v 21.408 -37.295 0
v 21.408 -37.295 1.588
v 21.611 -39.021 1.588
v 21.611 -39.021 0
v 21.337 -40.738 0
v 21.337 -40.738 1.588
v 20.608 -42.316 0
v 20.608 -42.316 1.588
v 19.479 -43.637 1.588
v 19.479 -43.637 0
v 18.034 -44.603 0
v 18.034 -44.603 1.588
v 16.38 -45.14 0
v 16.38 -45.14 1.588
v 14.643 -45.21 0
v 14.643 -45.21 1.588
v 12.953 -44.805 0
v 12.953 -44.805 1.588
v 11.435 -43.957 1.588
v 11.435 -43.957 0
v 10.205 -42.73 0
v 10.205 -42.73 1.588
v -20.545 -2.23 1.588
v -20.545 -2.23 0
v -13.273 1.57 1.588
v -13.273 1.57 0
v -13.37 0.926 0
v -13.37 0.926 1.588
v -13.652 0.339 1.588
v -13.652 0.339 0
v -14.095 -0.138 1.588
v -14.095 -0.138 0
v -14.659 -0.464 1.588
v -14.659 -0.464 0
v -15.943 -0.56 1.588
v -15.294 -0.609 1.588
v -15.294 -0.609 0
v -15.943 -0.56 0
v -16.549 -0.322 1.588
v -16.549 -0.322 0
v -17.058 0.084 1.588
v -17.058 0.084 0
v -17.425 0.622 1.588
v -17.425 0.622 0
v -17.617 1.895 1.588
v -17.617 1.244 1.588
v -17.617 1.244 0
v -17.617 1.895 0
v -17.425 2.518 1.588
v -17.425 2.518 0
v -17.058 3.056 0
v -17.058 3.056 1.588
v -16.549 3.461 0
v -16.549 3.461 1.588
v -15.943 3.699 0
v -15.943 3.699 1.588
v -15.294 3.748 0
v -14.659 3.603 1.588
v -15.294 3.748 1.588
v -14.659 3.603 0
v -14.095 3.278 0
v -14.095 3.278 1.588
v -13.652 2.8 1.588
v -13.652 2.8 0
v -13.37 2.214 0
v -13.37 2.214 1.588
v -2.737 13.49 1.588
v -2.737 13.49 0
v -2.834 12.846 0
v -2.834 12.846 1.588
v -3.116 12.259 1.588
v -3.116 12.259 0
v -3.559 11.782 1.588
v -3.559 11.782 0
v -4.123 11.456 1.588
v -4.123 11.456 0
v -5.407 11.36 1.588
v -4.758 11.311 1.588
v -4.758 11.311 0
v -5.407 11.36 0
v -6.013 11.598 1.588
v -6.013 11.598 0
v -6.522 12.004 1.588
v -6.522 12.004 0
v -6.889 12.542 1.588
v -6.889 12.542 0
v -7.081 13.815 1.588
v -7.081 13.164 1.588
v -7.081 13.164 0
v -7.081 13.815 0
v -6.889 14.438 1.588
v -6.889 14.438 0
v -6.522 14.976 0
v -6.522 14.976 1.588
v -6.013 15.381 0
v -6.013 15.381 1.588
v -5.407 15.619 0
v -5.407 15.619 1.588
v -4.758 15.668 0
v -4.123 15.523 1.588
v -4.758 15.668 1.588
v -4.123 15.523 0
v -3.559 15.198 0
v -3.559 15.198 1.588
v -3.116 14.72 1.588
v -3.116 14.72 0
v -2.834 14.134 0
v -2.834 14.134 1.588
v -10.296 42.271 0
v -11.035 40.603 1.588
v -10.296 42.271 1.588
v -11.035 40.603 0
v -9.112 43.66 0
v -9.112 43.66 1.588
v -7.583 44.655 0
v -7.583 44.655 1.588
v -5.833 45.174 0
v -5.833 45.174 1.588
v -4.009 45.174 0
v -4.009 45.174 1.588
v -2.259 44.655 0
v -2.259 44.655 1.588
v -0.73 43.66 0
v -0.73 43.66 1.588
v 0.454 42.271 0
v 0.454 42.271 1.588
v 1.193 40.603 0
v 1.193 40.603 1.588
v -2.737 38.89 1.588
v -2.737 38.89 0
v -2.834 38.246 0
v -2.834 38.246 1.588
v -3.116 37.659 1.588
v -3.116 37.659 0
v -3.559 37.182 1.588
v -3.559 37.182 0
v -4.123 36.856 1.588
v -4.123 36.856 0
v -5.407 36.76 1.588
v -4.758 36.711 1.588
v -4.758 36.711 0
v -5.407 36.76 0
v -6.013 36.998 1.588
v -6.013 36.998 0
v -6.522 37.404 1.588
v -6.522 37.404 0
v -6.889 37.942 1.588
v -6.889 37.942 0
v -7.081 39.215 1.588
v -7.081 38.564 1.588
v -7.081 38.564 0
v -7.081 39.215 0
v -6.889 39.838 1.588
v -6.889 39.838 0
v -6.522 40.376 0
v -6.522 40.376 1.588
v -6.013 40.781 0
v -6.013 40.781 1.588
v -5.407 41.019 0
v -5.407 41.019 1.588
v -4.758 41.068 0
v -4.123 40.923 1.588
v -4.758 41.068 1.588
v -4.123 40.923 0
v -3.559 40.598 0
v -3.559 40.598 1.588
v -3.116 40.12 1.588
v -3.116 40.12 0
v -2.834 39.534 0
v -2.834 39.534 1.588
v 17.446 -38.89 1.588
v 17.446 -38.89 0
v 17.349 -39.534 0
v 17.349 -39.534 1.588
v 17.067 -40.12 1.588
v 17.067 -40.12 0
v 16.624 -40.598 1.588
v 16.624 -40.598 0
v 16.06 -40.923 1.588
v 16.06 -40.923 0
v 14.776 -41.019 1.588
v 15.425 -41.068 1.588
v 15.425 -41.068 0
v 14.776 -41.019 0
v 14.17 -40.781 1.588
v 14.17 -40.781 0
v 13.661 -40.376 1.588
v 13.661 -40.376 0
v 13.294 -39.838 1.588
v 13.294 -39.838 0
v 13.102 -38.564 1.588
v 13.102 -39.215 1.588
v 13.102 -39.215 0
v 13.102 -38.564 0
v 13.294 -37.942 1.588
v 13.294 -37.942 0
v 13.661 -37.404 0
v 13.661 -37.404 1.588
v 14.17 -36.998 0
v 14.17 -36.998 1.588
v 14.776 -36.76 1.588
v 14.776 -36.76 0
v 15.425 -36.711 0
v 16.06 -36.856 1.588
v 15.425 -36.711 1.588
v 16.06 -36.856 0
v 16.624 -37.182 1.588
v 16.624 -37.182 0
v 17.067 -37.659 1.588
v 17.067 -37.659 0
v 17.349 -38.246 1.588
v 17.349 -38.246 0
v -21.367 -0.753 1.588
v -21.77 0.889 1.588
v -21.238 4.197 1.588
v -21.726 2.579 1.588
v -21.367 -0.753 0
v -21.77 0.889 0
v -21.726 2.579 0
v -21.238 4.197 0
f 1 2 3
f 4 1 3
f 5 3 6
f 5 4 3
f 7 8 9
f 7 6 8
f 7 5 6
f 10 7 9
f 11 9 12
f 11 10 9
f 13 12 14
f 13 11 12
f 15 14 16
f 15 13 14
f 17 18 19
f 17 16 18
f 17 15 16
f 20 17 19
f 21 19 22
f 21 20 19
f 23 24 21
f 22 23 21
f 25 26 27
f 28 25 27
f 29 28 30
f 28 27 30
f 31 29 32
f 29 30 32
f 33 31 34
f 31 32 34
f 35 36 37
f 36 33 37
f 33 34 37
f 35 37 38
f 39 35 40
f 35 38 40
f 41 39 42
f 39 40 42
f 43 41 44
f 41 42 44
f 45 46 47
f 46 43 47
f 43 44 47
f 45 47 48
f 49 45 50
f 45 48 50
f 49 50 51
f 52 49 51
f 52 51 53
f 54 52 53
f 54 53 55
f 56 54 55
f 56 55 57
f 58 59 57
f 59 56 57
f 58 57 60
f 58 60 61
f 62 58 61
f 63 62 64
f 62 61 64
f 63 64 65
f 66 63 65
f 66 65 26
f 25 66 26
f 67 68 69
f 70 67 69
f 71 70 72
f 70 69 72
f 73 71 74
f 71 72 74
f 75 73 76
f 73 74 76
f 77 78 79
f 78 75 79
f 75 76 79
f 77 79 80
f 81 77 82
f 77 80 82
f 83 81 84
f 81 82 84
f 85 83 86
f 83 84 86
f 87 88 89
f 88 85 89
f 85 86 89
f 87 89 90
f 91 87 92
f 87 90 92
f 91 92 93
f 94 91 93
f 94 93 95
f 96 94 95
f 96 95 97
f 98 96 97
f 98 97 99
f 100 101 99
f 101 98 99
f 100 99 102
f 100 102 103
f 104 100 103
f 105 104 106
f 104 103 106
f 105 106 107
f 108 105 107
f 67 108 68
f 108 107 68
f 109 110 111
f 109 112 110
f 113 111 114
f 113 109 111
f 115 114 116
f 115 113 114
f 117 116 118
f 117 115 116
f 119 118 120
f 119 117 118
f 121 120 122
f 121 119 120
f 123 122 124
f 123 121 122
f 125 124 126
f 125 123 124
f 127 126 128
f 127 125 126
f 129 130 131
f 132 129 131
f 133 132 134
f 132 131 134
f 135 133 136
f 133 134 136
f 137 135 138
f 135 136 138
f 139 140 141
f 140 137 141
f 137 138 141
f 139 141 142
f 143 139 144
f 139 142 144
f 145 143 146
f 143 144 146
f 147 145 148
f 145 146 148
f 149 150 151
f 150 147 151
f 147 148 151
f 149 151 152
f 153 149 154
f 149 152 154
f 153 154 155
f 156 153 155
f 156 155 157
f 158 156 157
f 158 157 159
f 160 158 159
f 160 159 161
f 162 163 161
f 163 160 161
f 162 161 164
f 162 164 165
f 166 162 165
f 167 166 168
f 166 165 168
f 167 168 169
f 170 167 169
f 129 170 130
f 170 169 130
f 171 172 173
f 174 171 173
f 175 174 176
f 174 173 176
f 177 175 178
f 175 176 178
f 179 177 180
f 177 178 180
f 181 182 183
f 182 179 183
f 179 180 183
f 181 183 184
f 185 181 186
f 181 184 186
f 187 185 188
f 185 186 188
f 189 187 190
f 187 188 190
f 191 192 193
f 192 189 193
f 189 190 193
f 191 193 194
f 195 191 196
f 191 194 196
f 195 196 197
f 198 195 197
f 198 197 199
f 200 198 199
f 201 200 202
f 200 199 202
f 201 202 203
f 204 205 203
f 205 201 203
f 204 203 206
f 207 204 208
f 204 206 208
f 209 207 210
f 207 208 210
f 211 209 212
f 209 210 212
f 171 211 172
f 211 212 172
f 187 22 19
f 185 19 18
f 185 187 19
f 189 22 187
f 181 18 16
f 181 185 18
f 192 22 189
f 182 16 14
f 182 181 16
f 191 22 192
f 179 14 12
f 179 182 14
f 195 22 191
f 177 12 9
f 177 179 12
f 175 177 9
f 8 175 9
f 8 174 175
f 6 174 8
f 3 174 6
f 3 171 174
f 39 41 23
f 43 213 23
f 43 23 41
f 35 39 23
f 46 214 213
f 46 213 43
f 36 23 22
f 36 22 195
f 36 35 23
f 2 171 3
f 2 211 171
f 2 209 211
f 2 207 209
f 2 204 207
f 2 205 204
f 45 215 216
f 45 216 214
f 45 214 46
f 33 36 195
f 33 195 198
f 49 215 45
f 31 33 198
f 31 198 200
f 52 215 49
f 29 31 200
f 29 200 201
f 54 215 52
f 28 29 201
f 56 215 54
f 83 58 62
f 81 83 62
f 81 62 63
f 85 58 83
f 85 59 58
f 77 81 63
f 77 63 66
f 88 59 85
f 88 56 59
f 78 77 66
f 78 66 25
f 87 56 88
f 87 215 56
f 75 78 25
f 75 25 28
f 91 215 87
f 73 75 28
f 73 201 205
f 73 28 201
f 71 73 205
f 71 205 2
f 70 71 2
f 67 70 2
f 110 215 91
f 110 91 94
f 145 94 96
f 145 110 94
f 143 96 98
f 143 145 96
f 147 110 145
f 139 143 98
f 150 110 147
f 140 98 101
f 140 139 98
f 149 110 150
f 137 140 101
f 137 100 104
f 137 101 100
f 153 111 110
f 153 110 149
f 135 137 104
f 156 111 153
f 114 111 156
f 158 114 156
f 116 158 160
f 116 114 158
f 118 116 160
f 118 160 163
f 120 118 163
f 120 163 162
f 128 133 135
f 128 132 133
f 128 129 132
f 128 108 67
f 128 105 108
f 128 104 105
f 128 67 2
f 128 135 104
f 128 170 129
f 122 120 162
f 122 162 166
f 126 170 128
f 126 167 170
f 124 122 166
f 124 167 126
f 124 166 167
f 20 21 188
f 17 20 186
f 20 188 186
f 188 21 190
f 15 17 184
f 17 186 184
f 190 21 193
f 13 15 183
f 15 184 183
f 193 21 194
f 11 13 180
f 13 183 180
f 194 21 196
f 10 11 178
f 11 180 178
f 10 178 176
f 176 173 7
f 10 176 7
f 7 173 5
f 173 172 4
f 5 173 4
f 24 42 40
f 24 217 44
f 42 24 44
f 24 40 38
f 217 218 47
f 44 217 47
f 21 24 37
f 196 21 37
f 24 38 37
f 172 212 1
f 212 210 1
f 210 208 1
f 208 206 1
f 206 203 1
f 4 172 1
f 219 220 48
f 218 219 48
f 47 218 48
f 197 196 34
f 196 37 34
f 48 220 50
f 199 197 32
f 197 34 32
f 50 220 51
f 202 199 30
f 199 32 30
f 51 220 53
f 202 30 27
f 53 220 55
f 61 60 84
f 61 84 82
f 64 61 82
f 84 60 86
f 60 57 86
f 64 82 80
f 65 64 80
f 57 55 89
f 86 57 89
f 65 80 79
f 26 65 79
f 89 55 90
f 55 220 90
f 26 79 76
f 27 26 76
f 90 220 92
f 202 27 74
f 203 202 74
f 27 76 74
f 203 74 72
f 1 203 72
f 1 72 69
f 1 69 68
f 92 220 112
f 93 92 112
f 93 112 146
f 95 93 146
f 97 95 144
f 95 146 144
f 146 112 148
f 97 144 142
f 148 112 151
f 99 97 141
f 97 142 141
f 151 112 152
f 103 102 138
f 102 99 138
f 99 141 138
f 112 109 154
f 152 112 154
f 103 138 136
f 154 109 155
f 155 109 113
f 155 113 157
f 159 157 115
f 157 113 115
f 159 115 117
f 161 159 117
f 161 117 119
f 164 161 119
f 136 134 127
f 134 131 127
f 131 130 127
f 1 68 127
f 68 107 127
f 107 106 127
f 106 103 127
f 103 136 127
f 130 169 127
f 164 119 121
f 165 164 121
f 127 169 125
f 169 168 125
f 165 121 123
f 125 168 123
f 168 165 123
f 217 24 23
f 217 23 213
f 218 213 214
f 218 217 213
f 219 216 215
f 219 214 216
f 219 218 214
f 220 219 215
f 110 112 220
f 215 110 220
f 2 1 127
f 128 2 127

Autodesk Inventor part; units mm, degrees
ref_plane "YZ Plane" through (0, 0, 0) normal (1, 0, 0) x (0, 1, 0)
ref_plane "XZ Plane" through (0, 0, 0) normal (0, 1, 0) x (-1, 0, 0)
ref_plane "XY Plane" through (0, 0, 0) normal (0, 0, 1) x (1, 0, 0)
sketch "Sketch1" plane through (0, 0, 0) normal (0, 0, 1) x (1, 0, 0)
  circle A0 centre (-4.920941, 38.889745) radius 2.1844
  circle A1 centre (-4.920941, 13.489745) radius 2.1844
  circle A2 centre (-15.45714, 1.56974) radius 2.1844
  circle A3 centre (15.262073, -38.889745) radius 2.1844
  circle A4 centre (15.262073, -38.889745) radius 6.35
  circle A5 centre (-15.45714, 1.56974) radius 6.35
  circle A6 centre (-4.920941, 38.889745) radius 6.35
  line L0 (-21.238079, 4.197144) -> (-11.03537, 40.603294)
  line L1 (1.193489, 40.603294) -> (21.408485, -37.294715)
  line L2 (-20.544521, -2.230399) -> (10.204623, -42.729627)
  point P0 (0, 0)
  dimension "d0" = 12.7
  dimension "d1" = 12.7
  dimension "d2" = 12.7
sketch "Sketch1 outline for Extrusion1" plane through (0, 0, 0) normal (0, 0, 1) x (1, 0, 0)
  line L0 (-20.544521, -2.230399) -> (10.204623, -42.729627)
  arc A0 (-21.238079, 4.197144) -> (-20.544521, -2.230399) centre (-15.45714, 1.56974) ccw
  arc A1 (10.204623, -42.729627) -> (21.408485, -37.294715) centre (15.262073, -38.889745) ccw
  line L1 (-11.03537, 40.603294) -> (-21.238079, 4.197144)
  line L2 (21.408485, -37.294715) -> (1.193489, 40.603294)
  arc A2 (1.193489, 40.603294) -> (-11.03537, 40.603294) centre (-4.920941, 38.889745) ccw
  circle A3 centre (15.262073, -38.889745) radius 2.1844
  circle A4 centre (-15.45714, 1.56974) radius 2.1844
  circle A5 centre (-4.920941, 13.489745) radius 2.1844
  circle A6 centre (-4.920941, 38.889745) radius 2.1844
extrude "Extrusion1" add sketch "Sketch1 outline for Extrusion1" along normal blind 1.5875
properties part number "intakesupport"
